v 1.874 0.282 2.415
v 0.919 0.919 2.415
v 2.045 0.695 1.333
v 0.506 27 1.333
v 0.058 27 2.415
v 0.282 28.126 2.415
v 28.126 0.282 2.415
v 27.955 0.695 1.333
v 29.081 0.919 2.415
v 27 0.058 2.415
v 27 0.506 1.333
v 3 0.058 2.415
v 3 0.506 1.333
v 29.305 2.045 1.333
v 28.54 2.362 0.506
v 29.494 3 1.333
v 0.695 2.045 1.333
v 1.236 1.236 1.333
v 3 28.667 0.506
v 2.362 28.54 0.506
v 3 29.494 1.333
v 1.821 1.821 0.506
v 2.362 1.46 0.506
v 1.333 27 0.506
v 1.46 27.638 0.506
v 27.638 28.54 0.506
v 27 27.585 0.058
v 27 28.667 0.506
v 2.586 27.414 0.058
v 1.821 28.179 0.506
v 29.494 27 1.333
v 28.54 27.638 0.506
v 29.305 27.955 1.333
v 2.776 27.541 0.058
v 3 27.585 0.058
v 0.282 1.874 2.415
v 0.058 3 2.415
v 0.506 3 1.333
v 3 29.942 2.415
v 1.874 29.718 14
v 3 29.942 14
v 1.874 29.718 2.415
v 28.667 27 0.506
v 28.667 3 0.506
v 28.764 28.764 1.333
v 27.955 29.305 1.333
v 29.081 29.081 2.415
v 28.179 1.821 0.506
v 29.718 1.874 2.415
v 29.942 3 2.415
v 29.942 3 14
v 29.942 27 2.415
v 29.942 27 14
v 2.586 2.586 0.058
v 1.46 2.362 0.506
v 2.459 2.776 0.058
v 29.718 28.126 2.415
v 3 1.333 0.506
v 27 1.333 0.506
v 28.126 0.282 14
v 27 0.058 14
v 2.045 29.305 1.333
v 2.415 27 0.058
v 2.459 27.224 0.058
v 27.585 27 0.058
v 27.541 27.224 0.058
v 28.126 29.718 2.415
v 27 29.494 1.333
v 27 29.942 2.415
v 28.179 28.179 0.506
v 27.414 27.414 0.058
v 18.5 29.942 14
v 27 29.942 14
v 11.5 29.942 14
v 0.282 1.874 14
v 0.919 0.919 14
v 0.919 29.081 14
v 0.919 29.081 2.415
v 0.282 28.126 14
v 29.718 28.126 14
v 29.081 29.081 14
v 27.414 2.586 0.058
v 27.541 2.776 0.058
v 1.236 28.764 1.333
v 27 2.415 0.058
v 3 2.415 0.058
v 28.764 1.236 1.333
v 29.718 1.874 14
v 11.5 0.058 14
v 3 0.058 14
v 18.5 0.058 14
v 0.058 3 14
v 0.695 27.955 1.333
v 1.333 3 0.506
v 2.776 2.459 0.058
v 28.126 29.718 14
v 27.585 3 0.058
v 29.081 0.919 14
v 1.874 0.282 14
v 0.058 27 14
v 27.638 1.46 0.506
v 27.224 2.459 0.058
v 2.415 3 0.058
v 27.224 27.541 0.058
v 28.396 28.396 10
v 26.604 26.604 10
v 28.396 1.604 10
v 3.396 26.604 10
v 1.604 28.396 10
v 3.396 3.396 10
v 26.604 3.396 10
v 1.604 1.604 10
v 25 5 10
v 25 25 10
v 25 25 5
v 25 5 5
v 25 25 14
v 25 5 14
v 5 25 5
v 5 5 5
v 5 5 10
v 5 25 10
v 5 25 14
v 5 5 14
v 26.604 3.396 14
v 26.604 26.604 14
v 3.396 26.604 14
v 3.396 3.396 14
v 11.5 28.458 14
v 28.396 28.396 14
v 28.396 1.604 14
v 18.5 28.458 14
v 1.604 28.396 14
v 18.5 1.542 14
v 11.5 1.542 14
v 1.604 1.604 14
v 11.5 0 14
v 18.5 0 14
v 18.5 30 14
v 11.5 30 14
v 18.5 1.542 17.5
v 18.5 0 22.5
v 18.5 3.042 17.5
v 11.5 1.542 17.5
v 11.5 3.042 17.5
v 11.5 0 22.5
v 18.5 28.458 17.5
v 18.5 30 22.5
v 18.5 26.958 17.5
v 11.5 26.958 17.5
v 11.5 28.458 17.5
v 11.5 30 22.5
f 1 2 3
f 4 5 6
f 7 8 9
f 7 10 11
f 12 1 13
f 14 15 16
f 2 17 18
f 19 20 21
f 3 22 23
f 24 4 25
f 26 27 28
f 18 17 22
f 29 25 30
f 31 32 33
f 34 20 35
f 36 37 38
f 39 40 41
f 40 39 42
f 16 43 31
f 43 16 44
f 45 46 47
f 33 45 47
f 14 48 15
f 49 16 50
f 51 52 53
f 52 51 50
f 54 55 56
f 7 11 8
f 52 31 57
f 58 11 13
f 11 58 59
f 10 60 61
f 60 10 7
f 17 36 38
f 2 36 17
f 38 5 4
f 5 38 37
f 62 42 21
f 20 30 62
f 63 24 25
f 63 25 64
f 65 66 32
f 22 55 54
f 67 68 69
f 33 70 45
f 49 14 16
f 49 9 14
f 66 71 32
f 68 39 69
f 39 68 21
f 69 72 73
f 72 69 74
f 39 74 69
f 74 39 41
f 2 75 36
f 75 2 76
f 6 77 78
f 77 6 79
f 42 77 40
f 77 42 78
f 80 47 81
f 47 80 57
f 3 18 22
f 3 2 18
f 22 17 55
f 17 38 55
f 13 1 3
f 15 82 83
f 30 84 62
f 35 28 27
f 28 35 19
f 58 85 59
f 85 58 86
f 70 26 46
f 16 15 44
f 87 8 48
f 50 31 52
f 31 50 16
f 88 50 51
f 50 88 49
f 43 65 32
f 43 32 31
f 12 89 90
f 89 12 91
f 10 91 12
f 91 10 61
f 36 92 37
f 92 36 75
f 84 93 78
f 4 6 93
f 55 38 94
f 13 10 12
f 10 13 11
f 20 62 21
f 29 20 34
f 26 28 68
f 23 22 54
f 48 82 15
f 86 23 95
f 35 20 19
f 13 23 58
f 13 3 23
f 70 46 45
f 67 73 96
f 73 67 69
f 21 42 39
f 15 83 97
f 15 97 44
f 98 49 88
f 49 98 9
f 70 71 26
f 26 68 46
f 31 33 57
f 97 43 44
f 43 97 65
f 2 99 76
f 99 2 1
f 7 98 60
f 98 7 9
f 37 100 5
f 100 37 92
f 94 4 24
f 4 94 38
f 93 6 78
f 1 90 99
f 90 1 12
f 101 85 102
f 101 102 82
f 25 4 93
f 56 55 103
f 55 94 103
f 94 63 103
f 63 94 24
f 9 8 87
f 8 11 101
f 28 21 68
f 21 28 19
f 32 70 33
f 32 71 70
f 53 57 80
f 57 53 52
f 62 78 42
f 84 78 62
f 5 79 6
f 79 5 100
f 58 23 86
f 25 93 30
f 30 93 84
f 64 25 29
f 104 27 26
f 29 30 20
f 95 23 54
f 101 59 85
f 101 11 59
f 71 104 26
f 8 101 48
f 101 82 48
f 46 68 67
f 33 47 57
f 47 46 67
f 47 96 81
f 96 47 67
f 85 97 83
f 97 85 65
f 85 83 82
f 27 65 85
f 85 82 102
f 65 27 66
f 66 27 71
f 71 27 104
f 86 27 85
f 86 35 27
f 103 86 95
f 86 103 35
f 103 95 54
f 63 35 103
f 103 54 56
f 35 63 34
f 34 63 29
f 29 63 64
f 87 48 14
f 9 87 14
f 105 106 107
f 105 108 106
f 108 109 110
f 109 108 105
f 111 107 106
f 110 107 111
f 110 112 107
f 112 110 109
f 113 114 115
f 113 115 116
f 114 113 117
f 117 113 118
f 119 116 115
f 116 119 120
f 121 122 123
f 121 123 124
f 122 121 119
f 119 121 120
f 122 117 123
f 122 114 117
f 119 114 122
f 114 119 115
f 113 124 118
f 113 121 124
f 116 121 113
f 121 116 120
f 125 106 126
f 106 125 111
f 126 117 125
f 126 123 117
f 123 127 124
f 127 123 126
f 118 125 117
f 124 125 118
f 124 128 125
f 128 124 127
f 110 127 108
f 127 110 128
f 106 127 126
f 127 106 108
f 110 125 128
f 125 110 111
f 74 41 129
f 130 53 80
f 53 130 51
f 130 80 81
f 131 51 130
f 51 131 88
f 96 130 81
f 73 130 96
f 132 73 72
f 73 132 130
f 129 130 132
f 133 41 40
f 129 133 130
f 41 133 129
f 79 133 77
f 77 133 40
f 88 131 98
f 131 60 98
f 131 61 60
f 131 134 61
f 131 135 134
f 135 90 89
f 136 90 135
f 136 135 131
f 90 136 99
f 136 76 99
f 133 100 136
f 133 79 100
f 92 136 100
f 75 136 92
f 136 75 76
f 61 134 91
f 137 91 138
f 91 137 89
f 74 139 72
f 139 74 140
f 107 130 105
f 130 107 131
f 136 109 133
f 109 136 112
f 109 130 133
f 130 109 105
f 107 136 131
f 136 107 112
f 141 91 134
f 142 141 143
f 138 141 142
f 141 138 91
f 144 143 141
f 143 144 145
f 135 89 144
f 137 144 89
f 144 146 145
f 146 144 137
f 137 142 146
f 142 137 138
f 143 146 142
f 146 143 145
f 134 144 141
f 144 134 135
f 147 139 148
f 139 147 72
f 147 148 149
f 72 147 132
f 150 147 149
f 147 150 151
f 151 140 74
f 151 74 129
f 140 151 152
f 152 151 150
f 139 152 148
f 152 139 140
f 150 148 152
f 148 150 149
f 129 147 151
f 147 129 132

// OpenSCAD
////////////////////////////////////////////////////////////////////////////////
// LCD
////////////////////////////////////////////////////////////////////////////////

LCD_BOARD_THICKNESS=1.6;
LCD_BOARD_WIDTH=40.0;
LCD_BOARD_HEIGHT=23.2 + 6.8;

LCD_PIN_THICKNESS=13-(1.6+9.0);

LCD_DISPLAY_THICKNESS=9.0;
LCD_DISPLAY_WIDTH=36;
LCD_DISPLAY_HEIGHT=23.2;

LCD_ACTIVE_WIDTH=30.4;
LCD_ACTIVE_HEIGHT=13.9;

LCD_TAB_LENGTH = 35.4 - LCD_BOARD_HEIGHT;
LCD_TAB_RADIUS = 2.5;
LCD_TAB_THICKNESS = 0.6;

LCD_HOLE_RADIUS = 1.5;

LCD_TOP_HOLE_SPACING = 36.0;
LCD_TOP_HOLE_OFFSET = 3.4;

// An ADM0802A 8x2 LCD Module
module lcd() {
	
	difference() {
		union() {
			// Board
			cube([LCD_BOARD_WIDTH, LCD_BOARD_HEIGHT, LCD_BOARD_THICKNESS]);
			
			// Display
			translate([LCD_BOARD_WIDTH/2 - LCD_DISPLAY_WIDTH/2, 0, LCD_BOARD_THICKNESS])
				cube([LCD_DISPLAY_WIDTH, LCD_DISPLAY_HEIGHT, LCD_DISPLAY_THICKNESS]);
			
			// Tabs
			for (x_offset = [0, LCD_BOARD_WIDTH-(LCD_TAB_RADIUS*2)]) {
				translate([x_offset, -(LCD_TAB_LENGTH-LCD_TAB_RADIUS), 0])
					cube([2*LCD_TAB_RADIUS, LCD_TAB_LENGTH-LCD_TAB_RADIUS, LCD_TAB_THICKNESS]);
				translate([x_offset + LCD_TAB_RADIUS, -(LCD_TAB_LENGTH-LCD_TAB_RADIUS), 0])
					cylinder(h=LCD_TAB_THICKNESS, r = LCD_TAB_RADIUS);
			}
			
			// Backing crap
			translate([0,0,-LCD_PIN_THICKNESS])
				% cube([LCD_BOARD_WIDTH, LCD_DISPLAY_HEIGHT, LCD_PIN_THICKNESS]);
		}
		
		// Mounting Holes
		union() {
			// Bottom tabs
			for (x_offset = [0, LCD_BOARD_WIDTH-(LCD_TAB_RADIUS*2)]) {
				translate([x_offset + LCD_TAB_RADIUS, -(LCD_TAB_LENGTH-LCD_TAB_RADIUS), 0])
					cylinder(r = LCD_HOLE_RADIUS, h=LCD_TAB_THICKNESS);
			}
			
			// Top
			for (x_offset = [0.0, 1.0]) {
				translate([ (LCD_BOARD_WIDTH/2) - (LCD_TOP_HOLE_SPACING/2) + (x_offset*LCD_TOP_HOLE_SPACING)
				           , LCD_BOARD_HEIGHT - LCD_TOP_HOLE_OFFSET
				           , 0
				           ])
					cylinder(r = LCD_HOLE_RADIUS, h=LCD_BOARD_THICKNESS);
			}
		}
	}
}

////////////////////////////////////////////////////////////////////////////////
// GPS
////////////////////////////////////////////////////////////////////////////////

GPS_BOARD_WIDTH = 30; 
GPS_BOARD_HEIGHT = 30; 
GPS_BOARD_THICKNESS = 0.8; 

GPS_CHIP_WIDTH = 25; 
GPS_CHIP_HEIGHT = 25; 
GPS_CHIP_THICKNESS = 4.2 + 0.8; 

GPS_PIN_THICKNESS = 2.2;

GPS_HOLE_X_OFFSET = 1.6;
GPS_HOLE_Y_OFFSET = 1.6;
GPS_HOLE_RADIUS = 1.0;

module gps() {
	difference() {
		union() {
			// Board
			cube([GPS_BOARD_WIDTH, GPS_BOARD_HEIGHT, GPS_BOARD_THICKNESS]);
			
			// Chip
			translate([ (GPS_BOARD_WIDTH/2) - (GPS_CHIP_WIDTH/2)
			          , (GPS_BOARD_HEIGHT/2) - (GPS_CHIP_HEIGHT/2)
			          , GPS_BOARD_THICKNESS
			          ])
				cube([GPS_CHIP_WIDTH, GPS_CHIP_HEIGHT, GPS_CHIP_THICKNESS]);
			
			// Pins
			translate([0,0,-GPS_PIN_THICKNESS])
				% cube([GPS_BOARD_WIDTH, GPS_BOARD_HEIGHT, GPS_PIN_THICKNESS]);
		}
		
		// Mounting holes
		union() {
			for (y = [0,1]) {
				for (x = [0,1]) {
					translate([ GPS_HOLE_X_OFFSET + x*(GPS_BOARD_WIDTH-(2*GPS_HOLE_X_OFFSET))
					          , GPS_HOLE_Y_OFFSET + y*(GPS_BOARD_WIDTH-(2*GPS_HOLE_Y_OFFSET))
					          , 0
					          ])
						cylinder(r=GPS_HOLE_RADIUS, h=GPS_BOARD_THICKNESS);
				}
			}
		}
	}
}


////////////////////////////////////////////////////////////////////////////////
// Maple Mini
////////////////////////////////////////////////////////////////////////////////

MPL_BOARD_WIDTH = 18.0;
MPL_BOARD_HEIGHT = 51.0;
MPL_BOARD_THICKNESS = 2; // ??

MPL_USB_WIDTH = 6.0; // ??
MPL_USB_HEIGHT = 7.0; // ??
MPL_USB_THICKNESS = 3.0; // ??
MPL_USB_OFFSET = -1.0; // ??

module maple() {
	union() {
		// Board
		cube([MPL_BOARD_WIDTH, MPL_BOARD_HEIGHT, MPL_BOARD_THICKNESS]);
		
		// USB
		translate([MPL_BOARD_WIDTH/2 - MPL_USB_WIDTH/2, MPL_USB_OFFSET, MPL_BOARD_THICKNESS])
			cube([MPL_USB_WIDTH, MPL_USB_HEIGHT, MPL_USB_THICKNESS]);
	}
}


////////////////////////////////////////////////////////////////////////////////
// Power Convertor
////////////////////////////////////////////////////////////////////////////////

PWR_BOARD_WIDTH = 12; // ??
PWR_BOARD_HEIGHT = 26; // ??
PWR_BOARD_THICKNESS = 2; // ??

PWR_USB_WIDTH = 11; // ??
PWR_USB_HEIGHT = 13; // ??
PWR_USB_THICKNESS = 5; // ??

module power() {
	union() {
		// Board
		cube([PWR_BOARD_WIDTH, PWR_BOARD_HEIGHT, PWR_BOARD_THICKNESS]);
		
		// USB
		translate([PWR_BOARD_WIDTH/2 - PWR_USB_WIDTH/2, 0, PWR_BOARD_THICKNESS])
			cube([PWR_USB_WIDTH, PWR_USB_HEIGHT, PWR_USB_THICKNESS]);
	}
}


////////////////////////////////////////////////////////////////////////////////
// AA Battery Holder
////////////////////////////////////////////////////////////////////////////////

BAT_WIDTH = 32; // ??
BAT_HEIGHT = 57; // ??
BAT_THICKNESS = 15.7; // ??

module batteries() {
	union() {
		// Container
		cube([BAT_WIDTH, BAT_HEIGHT, BAT_THICKNESS]);
	}
}


////////////////////////////////////////////////////////////////////////////////
// Rounded cube things
////////////////////////////////////////////////////////////////////////////////

DISABLE_ROUND_CUBE = false;

module round_cube(s, rs) {
	if (DISABLE_ROUND_CUBE) {
		cube(s);
	} else {
		hull() {
			for (x = [rs[0], s[0]-rs[0]]) {
				for (y = [rs[1], s[1]-rs[1]]) {
					for (z = [rs[2], s[2]-rs[1]]) {
						translate([x,y,z])
							scale([rs[0]/5, rs[1]/5, rs[2]/5])
								sphere(r = 5);
					}
				}
			}
		}
	}
}


////////////////////////////////////////////////////////////////////////////////
// AA-Battery
////////////////////////////////////////////////////////////////////////////////

AA_DIAMETER = 14.0;
AA_LENGTH = 48.5;

AA_NUB_DIAMETER = 5.2;
AA_NUB_LENGTH = 1.5;

AA_BTM_DIAMETER = 10;
AA_BTM_LENGTH = 0.4;

AA_BTM_HOLE_DIAMETER = 1.6;
AA_BTM_HOLE_LENGTH = 0.8;

module aa_bat() {
	
}

////////////////////////////////////////////////////////////////////////////////
// Case
////////////////////////////////////////////////////////////////////////////////

CASE_BAT_LENGTH = AA_LENGTH+AA_NUB_LENGTH+AA_BTM_LENGTH + 8.0;

CASE_WALL = 5.0;
CASE_ROUNDING = [CASE_WALL, CASE_WALL, CASE_WALL];

CASE_SCREEN_COVER_DEPTH = 2.0;
CASE_SCREEN_COVER_MARGIN = 3.0;
CASE_SCREEN_COVER_WIDTH  = LCD_ACTIVE_WIDTH;
CASE_SCREEN_COVER_HEIGHT = LCD_ACTIVE_HEIGHT;
CASE_SCREEN_COVER_THICKNESS = 3.0;

CASE_SCREEN_TOLLERANCE = 1;

CASE_GPS_TOLLERANCE = 0.5;

CASE_SWIRE_HEIGHT = 3.0;
CASE_SWIRE_WIDTH = LCD_BOARD_WIDTH - 10.0;
CASE_SWIRE_THICKNESS = 3.0;

CASE_BAT_DEPTH = 2.5;

CASE_WIDTH     = max(LCD_BOARD_WIDTH, CASE_SCREEN_COVER_WIDTH + 2*CASE_SCREEN_COVER_MARGIN) + 2*CASE_WALL;
CASE_HEIGHT    = LCD_BOARD_HEIGHT + 4*CASE_SCREEN_TOLLERANCE + CASE_SWIRE_HEIGHT + GPS_BOARD_HEIGHT + 2*CASE_GPS_TOLLERANCE + 2*CASE_WALL;
CASE_THICKNESS = BAT_THICKNESS + CASE_BAT_DEPTH
               + LCD_BOARD_THICKNESS + LCD_DISPLAY_THICKNESS
               + CASE_SCREEN_COVER_THICKNESS
               + CASE_SCREEN_COVER_DEPTH
               + CASE_SCREEN_TOLLERANCE*3
               ;

echo("Case size:", CASE_WIDTH, CASE_HEIGHT, CASE_THICKNESS);

module case() {
	difference() {
		// The case itself
		%round_cube([CASE_WIDTH, CASE_HEIGHT, CASE_THICKNESS], CASE_ROUNDING);
		
		// Carve out space inside
		union () {
			
			// -----------------------------------------------------------------------------
			
			// The hole for the screen
			translate([ CASE_WIDTH/2 - CASE_SCREEN_COVER_WIDTH/2
			          , CASE_HEIGHT - CASE_SWIRE_HEIGHT - CASE_WALL - LCD_BOARD_HEIGHT + (LCD_DISPLAY_HEIGHT-LCD_ACTIVE_HEIGHT)/2
			          , CASE_THICKNESS - CASE_SCREEN_COVER_DEPTH
			          ])
				cube([ CASE_SCREEN_COVER_WIDTH
				     , CASE_SCREEN_COVER_HEIGHT
				     , CASE_SCREEN_COVER_DEPTH
				     ]);
			
			// The hole for the perspex screen cover
			translate([ CASE_WIDTH/2 - CASE_SCREEN_COVER_WIDTH/2 - CASE_SCREEN_COVER_MARGIN
			          , CASE_HEIGHT - CASE_SWIRE_HEIGHT - CASE_WALL - LCD_BOARD_HEIGHT + (LCD_DISPLAY_HEIGHT-LCD_ACTIVE_HEIGHT)/2 - CASE_SCREEN_COVER_MARGIN
			          , CASE_THICKNESS - CASE_SCREEN_COVER_DEPTH - CASE_SCREEN_COVER_THICKNESS
			          ])
				cube([ CASE_SCREEN_COVER_WIDTH + 2*CASE_SCREEN_COVER_MARGIN
				     , CASE_SCREEN_COVER_HEIGHT + 2*CASE_SCREEN_COVER_MARGIN
				     , CASE_SCREEN_COVER_THICKNESS
				     ]);
			
			// The gap for the display itself
			translate([ CASE_WIDTH/2 - LCD_DISPLAY_WIDTH/2 - CASE_SCREEN_TOLLERANCE
			          , CASE_HEIGHT - CASE_SWIRE_HEIGHT - CASE_WALL - LCD_BOARD_HEIGHT - CASE_SCREEN_TOLLERANCE
			          , CASE_THICKNESS - CASE_SCREEN_COVER_DEPTH -
			            CASE_SCREEN_COVER_THICKNESS - LCD_DISPLAY_THICKNESS -
			            CASE_SCREEN_TOLLERANCE
			          ])
				cube([ LCD_DISPLAY_WIDTH + 2*CASE_SCREEN_TOLLERANCE
				     , LCD_DISPLAY_HEIGHT + 2*CASE_SCREEN_TOLLERANCE
				     , LCD_DISPLAY_THICKNESS + CASE_SCREEN_TOLLERANCE
				     ]);
			
			// The gap for wires from the display
			translate([ CASE_WIDTH/2 - CASE_SWIRE_WIDTH/2
			          , CASE_HEIGHT - CASE_SWIRE_HEIGHT - CASE_WALL - (LCD_BOARD_HEIGHT-LCD_DISPLAY_HEIGHT)
			          , CASE_THICKNESS - CASE_SCREEN_COVER_DEPTH -
			            CASE_SCREEN_COVER_THICKNESS - LCD_DISPLAY_THICKNESS -
			            CASE_SCREEN_TOLLERANCE*2 - LCD_BOARD_THICKNESS
			          ])
				cube([ CASE_SWIRE_WIDTH
				     , LCD_BOARD_HEIGHT - LCD_DISPLAY_HEIGHT + CASE_SWIRE_HEIGHT
				     , CASE_SWIRE_THICKNESS + LCD_BOARD_THICKNESS + CASE_SCREEN_TOLLERANCE
				     ]);
			
			// The gap for the LCD's board
			translate([ CASE_WIDTH/2 - LCD_BOARD_WIDTH/2 - CASE_SCREEN_TOLLERANCE
			          , CASE_HEIGHT - CASE_SWIRE_HEIGHT - CASE_WALL - LCD_BOARD_HEIGHT - CASE_SCREEN_TOLLERANCE
			          , CASE_THICKNESS - CASE_SCREEN_COVER_DEPTH -
			            CASE_SCREEN_COVER_THICKNESS - LCD_DISPLAY_THICKNESS -
			            CASE_SCREEN_TOLLERANCE*2 - LCD_BOARD_THICKNESS
			          ])
				cube([ LCD_BOARD_WIDTH + 2*CASE_SCREEN_TOLLERANCE
				     , LCD_BOARD_HEIGHT + 2*CASE_SCREEN_TOLLERANCE
				     , LCD_BOARD_THICKNESS + CASE_SCREEN_TOLLERANCE
				     ]);
			
			// The space for the tabs on the LCD
			translate([ CASE_WIDTH/2 - LCD_BOARD_WIDTH/2 - CASE_SCREEN_TOLLERANCE
			          , CASE_HEIGHT - CASE_SWIRE_HEIGHT - CASE_WALL - LCD_BOARD_HEIGHT -
			          3*CASE_SCREEN_TOLLERANCE - LCD_TAB_LENGTH
			          , CASE_THICKNESS - CASE_SCREEN_COVER_DEPTH -
			            CASE_SCREEN_COVER_THICKNESS - LCD_DISPLAY_THICKNESS -
			            CASE_SCREEN_TOLLERANCE*2 - LCD_BOARD_THICKNESS
			          ])
				cube([ LCD_TAB_RADIUS + 2*CASE_SCREEN_TOLLERANCE
				     , LCD_TAB_LENGTH + 2*CASE_SCREEN_TOLLERANCE
				     , LCD_BOARD_THICKNESS + CASE_SCREEN_TOLLERANCE
				     ]);
			translate([ CASE_WIDTH/2 + LCD_BOARD_WIDTH/2 - CASE_SCREEN_TOLLERANCE - LCD_TAB_RADIUS
			          , CASE_HEIGHT - CASE_SWIRE_HEIGHT - CASE_WALL - LCD_BOARD_HEIGHT -
			          3*CASE_SCREEN_TOLLERANCE - LCD_TAB_LENGTH
			          , CASE_THICKNESS - CASE_SCREEN_COVER_DEPTH -
			            CASE_SCREEN_COVER_THICKNESS - LCD_DISPLAY_THICKNESS -
			            CASE_SCREEN_TOLLERANCE*2 - LCD_BOARD_THICKNESS
			          ])
				cube([ LCD_TAB_RADIUS + 2*CASE_SCREEN_TOLLERANCE
				     , LCD_TAB_LENGTH + 2*CASE_SCREEN_TOLLERANCE
				     , LCD_BOARD_THICKNESS + CASE_SCREEN_TOLLERANCE
				     ]);
			
			// -----------------------------------------------------------------------------
			
			// The GPS chip antenna
			translate([ CASE_WALL + (GPS_BOARD_HEIGHT-GPS_CHIP_HEIGHT)/2 - CASE_GPS_TOLLERANCE
			          , CASE_WALL + (GPS_BOARD_HEIGHT-GPS_CHIP_HEIGHT)/2 - CASE_GPS_TOLLERANCE
			          , CASE_THICKNESS - GPS_CHIP_THICKNESS - CASE_WALL
			          ])
				cube([ GPS_CHIP_WIDTH + 2*CASE_GPS_TOLLERANCE
				     , GPS_CHIP_HEIGHT + 2*CASE_GPS_TOLLERANCE
				     , GPS_CHIP_THICKNESS + CASE_GPS_TOLLERANCE
				     ]);
			
			// The GPS board + pins
			translate([ CASE_WALL
			          , CASE_WALL - CASE_GPS_TOLLERANCE
			          , CASE_THICKNESS - (GPS_CHIP_THICKNESS + GPS_BOARD_THICKNESS +
			          GPS_PIN_THICKNESS) - CASE_WALL
			          ])
				cube([ GPS_BOARD_WIDTH + 2*CASE_GPS_TOLLERANCE
				     , GPS_BOARD_HEIGHT + 2*CASE_GPS_TOLLERANCE
				     , GPS_BOARD_THICKNESS + GPS_PIN_THICKNESS + CASE_GPS_TOLLERANCE
				     ]);
			
			// -----------------------------------------------------------------------------
			
			// Battery Area
			translate([ CASE_WALL
			          , CASE_WALL
			          , CASE_BAT_DEPTH
			          ])
				cube([BAT_WIDTH, BAT_HEIGHT, BAT_THICKNESS]);
		}
	}
}


////////////////////////////////////////////////////////////////////////////////
// Halves of a hollow container
////////////////////////////////////////////////////////////////////////////////

// size: The size of the box [w,h,t]
// wall_thickness: Thicknesses of the walls of the box
// joint_size: The size of the joint
// joint_tollerance: Size of a gap added as extra around the join.
// female: Is this the female part of the box?
// radius: The radius of the rounding of the corners
module box_half(size, wall_thickness, joint_size, joint_tollerance, female, radius) {
	// Half is in the top, half in the bottom
	joint_tollerance = joint_tollerance / 2;
	
	union() {
		// The box itself
		difference() {
			round_cube([size[0], size[1], size[2]+radius], [radius,radius, radius]);
			
			// Chop the rounded corners off
			translate([0,0,size[2]])
				cube([size[0], size[1], radius]);
			
			
			// Hollow out the inside
			translate([wall_thickness, wall_thickness, wall_thickness])
				cube([ size[0] - (wall_thickness*2)
				     , size[1] - (wall_thickness*2)
				     , size[2]
				     ]);
		}
		
		// Create the joint
		if (!female) {
			difference() {
				translate([wall_thickness/3 + joint_tollerance/4, wall_thickness/3 + joint_tollerance/4, size[2]])
					cube([ size[0] - (2*(wall_thickness/3)) - joint_tollerance/2
					     , size[1] - (2*(wall_thickness/3)) - joint_tollerance/2
					     , joint_size
					     ]);
				
				translate([2*(wall_thickness/3) - joint_tollerance/4, 2*(wall_thickness/3) - joint_tollerance/4, size[2] - 1])
					cube([ size[0] - (4*(wall_thickness/3)) + joint_tollerance/2
					     , size[1] - (4*(wall_thickness/3)) + joint_tollerance/2
					     , joint_size + 2
					     ]);
			}
		} else {
			union() {
				// Inner lip
				difference() {
					translate([2*(wall_thickness/3) + joint_tollerance/4, 2*(wall_thickness/3) + joint_tollerance/4, size[2]])
						cube([ size[0] - (4*(wall_thickness/3)) - joint_tollerance/2
						     , size[1] - (4*(wall_thickness/3)) - joint_tollerance/2
						     , joint_size
						     ]);
					
					translate([wall_thickness, wall_thickness, size[2] - 1])
						cube([ size[0] - 2*wall_thickness
						     , size[1] - 2*wall_thickness
						     , joint_size + 2
						     ]);
					
				}
				
				// Outer Lip
				difference() {
					intersection() {
						translate([0,0,size[2]-radius])
							round_cube([size[0],size[1],joint_size+(radius*2)], [radius,radius,radius]);
						translate([0,0,size[2]])
							cube([size[0],size[1],joint_size]);
					}
					
					translate([wall_thickness/3 - joint_tollerance/4, wall_thickness/3 - joint_tollerance/4, size[2]-1])
						cube([ size[0] - (2*(wall_thickness/3))  + joint_tollerance/2
						     , size[1] - (2*(wall_thickness/3))  + joint_tollerance/2
						     , joint_size + 2
						     ]);
				}
			}
		}
	}
}

// translate([0,0,0])
// 	box_half(size = [30,30,10], wall_thickness = 5, joint_size = 4, joint_tollerance = 0.5, female = false, radius = 3);
// translate([40,0,0])
// 	box_half(size = [30,30,10], wall_thickness = 5, joint_size = 4, joint_tollerance = 0.5, female = true, radius = 3);


////////////////////////////////////////////////////////////////////////////////
// Clips and their cutout
////////////////////////////////////////////////////////////////////////////////

// width: The width of the clip
// thickness: The thickness of the shaft
// shaft_length: The length of the straight section of the clip
// clip_length: The length of the angled clip section (additional to the shaft_length)
// clip_protrusion: The distance the point of the clip sticks out from the shaft.
// clip_tollerance: The additional space added around a clip to account for manufacturing errors.
module clip(width, thickness, shaft_length, clip_length, clip_protrusion, clip_tollerance) {
	width = width + clip_tollerance;
	translate([-clip_tollerance/2, 0,0])
		union() {
			// Shaft
			cube([width, thickness + clip_tollerance, shaft_length - clip_tollerance]);
			
			// Clip
			translate([0,0,shaft_length - clip_tollerance]) {
				difference() {
					cube([width, thickness + clip_protrusion + clip_tollerance, clip_length + 2*clip_tollerance]);
				
					translate([-1,0,clip_length + clip_tollerance*2])
						rotate(a=[-atan((clip_length+2*clip_tollerance)/(thickness + clip_protrusion + clip_tollerance)),0,0])
							cube([width+2, sqrt(pow(thickness + clip_protrusion + clip_tollerance, 2) + pow(clip_length + 2*clip_tollerance,2)), clip_length]);
				}
			}
		}
}


////////////////////////////////////////////////////////////////////////////////
// Experimentation
////////////////////////////////////////////////////////////////////////////////

size = [30,30,10];
wall_thickness = 5;
joint_size = 4;
joint_tollerance = 0.5;
radius = 3;
clip_thickness = (wall_thickness/3) - (joint_tollerance/4);
shaft_length = 3.5;
clip_length = 5;
clip_protrusion = 1.5;
clip_width = 7;
pos_clip_tollerance = 0.0;
neg_clip_tollerance = 0.5;

//translate([0,0,0]) {
//	difference() {
//		box_half( size = size, wall_thickness = wall_thickness
//		        , joint_size = joint_size, joint_tollerance = joint_tollerance
//		        , female = false, radius = radius
//		        );
//		// Left clip
//		translate([(size[0]/2) - (clip_width/2),0, size[2]])
//			mirror([0,0,1])
//				clip( width = clip_width, thickness = clip_thickness
//				    , shaft_length = shaft_length, clip_length = clip_length
//				    , clip_protrusion = clip_protrusion, clip_tollerance = neg_clip_tollerance);
//		// Right clip
//		translate([(size[0]/2) - (clip_width/2), size[1], size[2]])
//			mirror([0,0,1])
//			mirror([0,1,0])
//				clip( width = clip_width, thickness = clip_thickness
//				    , shaft_length = shaft_length, clip_length = clip_length
//				    , clip_protrusion = clip_protrusion, clip_tollerance = neg_clip_tollerance);
//	}
//}

translate([0,0,0]) {
	union() {
		box_half( size = size, wall_thickness = wall_thickness
		        , joint_size = joint_size, joint_tollerance = joint_tollerance
		        , female = true, radius = radius
		        );
		// Left clip
		translate([(size[0]/2) - (clip_width/2),0, size[2] + joint_size])
			clip( width = clip_width, thickness = clip_thickness
			    , shaft_length = shaft_length, clip_length = clip_length
			    , clip_protrusion = clip_protrusion, clip_tollerance = pos_clip_tollerance);
		// Right clip
		translate([(size[0]/2) - (clip_width/2), size[1], size[2] + joint_size])
			mirror([0,1,0])
				clip( width = clip_width, thickness = clip_thickness
				    , shaft_length = shaft_length, clip_length = clip_length
				    , clip_protrusion = clip_protrusion, clip_tollerance = pos_clip_tollerance);
	}
}
